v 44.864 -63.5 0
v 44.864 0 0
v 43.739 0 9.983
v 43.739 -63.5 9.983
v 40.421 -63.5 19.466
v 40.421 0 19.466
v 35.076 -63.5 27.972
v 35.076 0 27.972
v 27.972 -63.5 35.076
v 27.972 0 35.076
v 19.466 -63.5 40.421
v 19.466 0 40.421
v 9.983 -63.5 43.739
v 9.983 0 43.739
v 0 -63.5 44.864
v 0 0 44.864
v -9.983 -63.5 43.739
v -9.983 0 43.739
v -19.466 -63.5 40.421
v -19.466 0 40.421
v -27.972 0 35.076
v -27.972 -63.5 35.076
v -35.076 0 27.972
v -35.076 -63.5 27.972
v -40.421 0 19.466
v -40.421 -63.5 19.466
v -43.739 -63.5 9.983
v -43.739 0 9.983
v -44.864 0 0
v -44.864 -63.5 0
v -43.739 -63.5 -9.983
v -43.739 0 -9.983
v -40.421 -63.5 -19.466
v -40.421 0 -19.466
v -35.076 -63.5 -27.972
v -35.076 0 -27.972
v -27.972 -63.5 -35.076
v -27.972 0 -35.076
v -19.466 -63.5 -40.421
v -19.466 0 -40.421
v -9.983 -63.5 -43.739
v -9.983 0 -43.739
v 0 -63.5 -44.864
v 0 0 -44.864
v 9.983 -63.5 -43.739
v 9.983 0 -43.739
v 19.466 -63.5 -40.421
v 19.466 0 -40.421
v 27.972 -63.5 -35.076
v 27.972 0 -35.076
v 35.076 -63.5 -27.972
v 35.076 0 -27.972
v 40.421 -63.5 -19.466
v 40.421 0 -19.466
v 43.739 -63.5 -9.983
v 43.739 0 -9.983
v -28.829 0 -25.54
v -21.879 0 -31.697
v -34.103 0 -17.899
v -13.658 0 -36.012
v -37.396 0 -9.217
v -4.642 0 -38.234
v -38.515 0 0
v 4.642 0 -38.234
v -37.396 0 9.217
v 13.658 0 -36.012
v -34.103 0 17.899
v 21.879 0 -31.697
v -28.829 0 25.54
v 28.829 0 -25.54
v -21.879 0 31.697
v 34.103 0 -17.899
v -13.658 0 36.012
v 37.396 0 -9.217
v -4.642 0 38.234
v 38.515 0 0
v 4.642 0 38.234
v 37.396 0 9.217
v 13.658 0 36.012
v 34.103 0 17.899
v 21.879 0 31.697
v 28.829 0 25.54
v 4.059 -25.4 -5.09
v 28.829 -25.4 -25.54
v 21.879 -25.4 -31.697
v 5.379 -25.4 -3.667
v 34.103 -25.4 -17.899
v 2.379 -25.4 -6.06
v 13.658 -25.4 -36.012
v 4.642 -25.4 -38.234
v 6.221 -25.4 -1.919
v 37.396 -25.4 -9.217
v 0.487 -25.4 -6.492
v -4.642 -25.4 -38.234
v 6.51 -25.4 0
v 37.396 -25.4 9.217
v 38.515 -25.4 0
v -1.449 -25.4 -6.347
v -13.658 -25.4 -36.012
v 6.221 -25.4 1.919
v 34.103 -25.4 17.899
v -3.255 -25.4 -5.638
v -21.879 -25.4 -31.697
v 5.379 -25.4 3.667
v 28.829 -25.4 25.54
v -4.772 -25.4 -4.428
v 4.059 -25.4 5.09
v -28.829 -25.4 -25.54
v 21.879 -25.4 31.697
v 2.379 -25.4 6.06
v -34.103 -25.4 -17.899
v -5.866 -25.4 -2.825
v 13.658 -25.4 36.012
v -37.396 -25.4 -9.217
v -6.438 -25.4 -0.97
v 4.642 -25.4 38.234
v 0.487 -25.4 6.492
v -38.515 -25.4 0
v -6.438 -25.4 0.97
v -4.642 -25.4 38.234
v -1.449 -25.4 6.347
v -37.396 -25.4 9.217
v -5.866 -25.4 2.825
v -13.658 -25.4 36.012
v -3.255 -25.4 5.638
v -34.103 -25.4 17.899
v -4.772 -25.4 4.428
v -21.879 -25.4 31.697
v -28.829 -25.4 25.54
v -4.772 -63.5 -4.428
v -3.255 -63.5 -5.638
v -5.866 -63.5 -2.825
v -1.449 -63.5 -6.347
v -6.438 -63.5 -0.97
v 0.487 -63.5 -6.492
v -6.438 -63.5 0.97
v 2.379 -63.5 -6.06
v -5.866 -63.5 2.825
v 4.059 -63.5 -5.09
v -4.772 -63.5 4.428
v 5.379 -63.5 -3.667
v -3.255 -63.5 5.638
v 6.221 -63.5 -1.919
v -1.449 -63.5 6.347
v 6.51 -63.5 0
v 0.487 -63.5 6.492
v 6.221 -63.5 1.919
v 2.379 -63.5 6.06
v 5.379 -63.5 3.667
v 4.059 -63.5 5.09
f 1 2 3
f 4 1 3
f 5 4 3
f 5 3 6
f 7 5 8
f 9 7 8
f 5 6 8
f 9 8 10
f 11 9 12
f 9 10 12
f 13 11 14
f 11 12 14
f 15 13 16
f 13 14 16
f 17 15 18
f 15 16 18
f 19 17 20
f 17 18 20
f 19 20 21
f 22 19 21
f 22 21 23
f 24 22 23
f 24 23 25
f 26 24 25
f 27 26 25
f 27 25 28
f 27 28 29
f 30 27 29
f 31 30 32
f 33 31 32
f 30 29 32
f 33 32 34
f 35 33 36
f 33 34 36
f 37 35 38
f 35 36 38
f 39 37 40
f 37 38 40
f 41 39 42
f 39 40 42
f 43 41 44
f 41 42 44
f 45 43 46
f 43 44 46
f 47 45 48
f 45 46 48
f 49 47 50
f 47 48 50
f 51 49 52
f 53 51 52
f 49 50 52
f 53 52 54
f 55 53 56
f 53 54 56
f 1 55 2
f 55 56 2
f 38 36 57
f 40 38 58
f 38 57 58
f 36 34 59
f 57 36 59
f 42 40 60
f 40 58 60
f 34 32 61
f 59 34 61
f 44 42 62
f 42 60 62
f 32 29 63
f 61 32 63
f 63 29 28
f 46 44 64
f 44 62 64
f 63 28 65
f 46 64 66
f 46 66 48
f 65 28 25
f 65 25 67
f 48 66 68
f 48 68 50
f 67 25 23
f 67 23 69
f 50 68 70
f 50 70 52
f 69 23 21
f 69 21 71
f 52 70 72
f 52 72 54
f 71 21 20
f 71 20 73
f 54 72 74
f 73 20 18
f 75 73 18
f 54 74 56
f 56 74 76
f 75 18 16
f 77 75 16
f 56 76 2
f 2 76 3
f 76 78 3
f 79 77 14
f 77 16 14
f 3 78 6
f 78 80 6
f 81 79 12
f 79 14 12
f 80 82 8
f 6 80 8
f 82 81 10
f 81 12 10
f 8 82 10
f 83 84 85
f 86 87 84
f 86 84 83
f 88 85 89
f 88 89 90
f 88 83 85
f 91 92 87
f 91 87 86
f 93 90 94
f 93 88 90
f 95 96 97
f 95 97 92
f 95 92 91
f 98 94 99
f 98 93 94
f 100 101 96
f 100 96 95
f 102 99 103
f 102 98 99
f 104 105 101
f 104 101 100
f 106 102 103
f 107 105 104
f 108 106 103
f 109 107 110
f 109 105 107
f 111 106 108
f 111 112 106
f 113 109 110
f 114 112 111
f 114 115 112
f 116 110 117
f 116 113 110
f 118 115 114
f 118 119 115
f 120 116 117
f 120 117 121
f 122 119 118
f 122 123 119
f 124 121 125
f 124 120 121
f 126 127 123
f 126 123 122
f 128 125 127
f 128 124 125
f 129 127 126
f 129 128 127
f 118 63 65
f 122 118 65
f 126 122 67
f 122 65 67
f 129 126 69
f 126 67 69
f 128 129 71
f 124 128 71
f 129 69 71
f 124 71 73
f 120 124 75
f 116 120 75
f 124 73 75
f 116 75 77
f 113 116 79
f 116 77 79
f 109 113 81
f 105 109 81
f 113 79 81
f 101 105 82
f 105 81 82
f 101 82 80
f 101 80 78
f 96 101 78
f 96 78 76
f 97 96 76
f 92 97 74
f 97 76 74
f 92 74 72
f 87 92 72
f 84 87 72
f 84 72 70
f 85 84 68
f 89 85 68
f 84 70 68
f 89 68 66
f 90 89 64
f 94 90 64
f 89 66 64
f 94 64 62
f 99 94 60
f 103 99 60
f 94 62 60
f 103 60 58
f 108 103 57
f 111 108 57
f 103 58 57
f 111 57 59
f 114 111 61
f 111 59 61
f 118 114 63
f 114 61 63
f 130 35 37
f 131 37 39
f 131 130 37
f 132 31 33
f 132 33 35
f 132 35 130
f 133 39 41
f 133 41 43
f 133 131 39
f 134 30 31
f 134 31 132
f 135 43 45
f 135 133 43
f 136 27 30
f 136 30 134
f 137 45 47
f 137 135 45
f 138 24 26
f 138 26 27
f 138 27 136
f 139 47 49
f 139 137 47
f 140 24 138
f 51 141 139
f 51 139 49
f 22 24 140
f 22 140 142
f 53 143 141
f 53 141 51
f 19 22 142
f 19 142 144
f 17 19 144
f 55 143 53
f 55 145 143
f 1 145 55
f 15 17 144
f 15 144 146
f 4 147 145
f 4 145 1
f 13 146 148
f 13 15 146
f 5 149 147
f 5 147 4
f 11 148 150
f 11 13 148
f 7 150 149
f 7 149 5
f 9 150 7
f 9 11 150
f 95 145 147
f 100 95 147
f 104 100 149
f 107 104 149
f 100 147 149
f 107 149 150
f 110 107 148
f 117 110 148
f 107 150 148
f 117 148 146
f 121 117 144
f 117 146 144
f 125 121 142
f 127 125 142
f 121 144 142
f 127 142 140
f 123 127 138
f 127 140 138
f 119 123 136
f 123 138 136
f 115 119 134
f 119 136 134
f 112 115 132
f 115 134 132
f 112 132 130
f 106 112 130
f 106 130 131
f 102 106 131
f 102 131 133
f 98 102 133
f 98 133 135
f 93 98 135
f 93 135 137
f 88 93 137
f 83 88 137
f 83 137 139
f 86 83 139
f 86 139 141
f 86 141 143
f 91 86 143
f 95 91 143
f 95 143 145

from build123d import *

# Parameters (mm, degrees)
F0_R     = 44.863573
F1_DEPTH = 63.5
F2_R     = 38.515034
F3_DEPTH = 25.4
F4_R     = 6.510435
F5_DEPTH = 63.5


with BuildPart() as f1:
    # F0 (on Front) → F1 (new body)
    with BuildSketch(Plane.XZ):
        Circle(F0_R)
    extrude(amount=F1_DEPTH)

    # F2 (on face) → F3 (cut)
    with BuildSketch(Plane(origin=(0, 0, 0), x_dir=(-1, 0, 0), z_dir=(0, 1, 0))):
        Circle(F2_R)
    extrude(amount=-F3_DEPTH, mode=Mode.SUBTRACT)

    # F4 (on face) → F5 (cut)
    with BuildSketch(Plane.XZ.offset(63.5)):
        Circle(F4_R)
    extrude(amount=-F5_DEPTH, mode=Mode.SUBTRACT)


solid = f1.part
